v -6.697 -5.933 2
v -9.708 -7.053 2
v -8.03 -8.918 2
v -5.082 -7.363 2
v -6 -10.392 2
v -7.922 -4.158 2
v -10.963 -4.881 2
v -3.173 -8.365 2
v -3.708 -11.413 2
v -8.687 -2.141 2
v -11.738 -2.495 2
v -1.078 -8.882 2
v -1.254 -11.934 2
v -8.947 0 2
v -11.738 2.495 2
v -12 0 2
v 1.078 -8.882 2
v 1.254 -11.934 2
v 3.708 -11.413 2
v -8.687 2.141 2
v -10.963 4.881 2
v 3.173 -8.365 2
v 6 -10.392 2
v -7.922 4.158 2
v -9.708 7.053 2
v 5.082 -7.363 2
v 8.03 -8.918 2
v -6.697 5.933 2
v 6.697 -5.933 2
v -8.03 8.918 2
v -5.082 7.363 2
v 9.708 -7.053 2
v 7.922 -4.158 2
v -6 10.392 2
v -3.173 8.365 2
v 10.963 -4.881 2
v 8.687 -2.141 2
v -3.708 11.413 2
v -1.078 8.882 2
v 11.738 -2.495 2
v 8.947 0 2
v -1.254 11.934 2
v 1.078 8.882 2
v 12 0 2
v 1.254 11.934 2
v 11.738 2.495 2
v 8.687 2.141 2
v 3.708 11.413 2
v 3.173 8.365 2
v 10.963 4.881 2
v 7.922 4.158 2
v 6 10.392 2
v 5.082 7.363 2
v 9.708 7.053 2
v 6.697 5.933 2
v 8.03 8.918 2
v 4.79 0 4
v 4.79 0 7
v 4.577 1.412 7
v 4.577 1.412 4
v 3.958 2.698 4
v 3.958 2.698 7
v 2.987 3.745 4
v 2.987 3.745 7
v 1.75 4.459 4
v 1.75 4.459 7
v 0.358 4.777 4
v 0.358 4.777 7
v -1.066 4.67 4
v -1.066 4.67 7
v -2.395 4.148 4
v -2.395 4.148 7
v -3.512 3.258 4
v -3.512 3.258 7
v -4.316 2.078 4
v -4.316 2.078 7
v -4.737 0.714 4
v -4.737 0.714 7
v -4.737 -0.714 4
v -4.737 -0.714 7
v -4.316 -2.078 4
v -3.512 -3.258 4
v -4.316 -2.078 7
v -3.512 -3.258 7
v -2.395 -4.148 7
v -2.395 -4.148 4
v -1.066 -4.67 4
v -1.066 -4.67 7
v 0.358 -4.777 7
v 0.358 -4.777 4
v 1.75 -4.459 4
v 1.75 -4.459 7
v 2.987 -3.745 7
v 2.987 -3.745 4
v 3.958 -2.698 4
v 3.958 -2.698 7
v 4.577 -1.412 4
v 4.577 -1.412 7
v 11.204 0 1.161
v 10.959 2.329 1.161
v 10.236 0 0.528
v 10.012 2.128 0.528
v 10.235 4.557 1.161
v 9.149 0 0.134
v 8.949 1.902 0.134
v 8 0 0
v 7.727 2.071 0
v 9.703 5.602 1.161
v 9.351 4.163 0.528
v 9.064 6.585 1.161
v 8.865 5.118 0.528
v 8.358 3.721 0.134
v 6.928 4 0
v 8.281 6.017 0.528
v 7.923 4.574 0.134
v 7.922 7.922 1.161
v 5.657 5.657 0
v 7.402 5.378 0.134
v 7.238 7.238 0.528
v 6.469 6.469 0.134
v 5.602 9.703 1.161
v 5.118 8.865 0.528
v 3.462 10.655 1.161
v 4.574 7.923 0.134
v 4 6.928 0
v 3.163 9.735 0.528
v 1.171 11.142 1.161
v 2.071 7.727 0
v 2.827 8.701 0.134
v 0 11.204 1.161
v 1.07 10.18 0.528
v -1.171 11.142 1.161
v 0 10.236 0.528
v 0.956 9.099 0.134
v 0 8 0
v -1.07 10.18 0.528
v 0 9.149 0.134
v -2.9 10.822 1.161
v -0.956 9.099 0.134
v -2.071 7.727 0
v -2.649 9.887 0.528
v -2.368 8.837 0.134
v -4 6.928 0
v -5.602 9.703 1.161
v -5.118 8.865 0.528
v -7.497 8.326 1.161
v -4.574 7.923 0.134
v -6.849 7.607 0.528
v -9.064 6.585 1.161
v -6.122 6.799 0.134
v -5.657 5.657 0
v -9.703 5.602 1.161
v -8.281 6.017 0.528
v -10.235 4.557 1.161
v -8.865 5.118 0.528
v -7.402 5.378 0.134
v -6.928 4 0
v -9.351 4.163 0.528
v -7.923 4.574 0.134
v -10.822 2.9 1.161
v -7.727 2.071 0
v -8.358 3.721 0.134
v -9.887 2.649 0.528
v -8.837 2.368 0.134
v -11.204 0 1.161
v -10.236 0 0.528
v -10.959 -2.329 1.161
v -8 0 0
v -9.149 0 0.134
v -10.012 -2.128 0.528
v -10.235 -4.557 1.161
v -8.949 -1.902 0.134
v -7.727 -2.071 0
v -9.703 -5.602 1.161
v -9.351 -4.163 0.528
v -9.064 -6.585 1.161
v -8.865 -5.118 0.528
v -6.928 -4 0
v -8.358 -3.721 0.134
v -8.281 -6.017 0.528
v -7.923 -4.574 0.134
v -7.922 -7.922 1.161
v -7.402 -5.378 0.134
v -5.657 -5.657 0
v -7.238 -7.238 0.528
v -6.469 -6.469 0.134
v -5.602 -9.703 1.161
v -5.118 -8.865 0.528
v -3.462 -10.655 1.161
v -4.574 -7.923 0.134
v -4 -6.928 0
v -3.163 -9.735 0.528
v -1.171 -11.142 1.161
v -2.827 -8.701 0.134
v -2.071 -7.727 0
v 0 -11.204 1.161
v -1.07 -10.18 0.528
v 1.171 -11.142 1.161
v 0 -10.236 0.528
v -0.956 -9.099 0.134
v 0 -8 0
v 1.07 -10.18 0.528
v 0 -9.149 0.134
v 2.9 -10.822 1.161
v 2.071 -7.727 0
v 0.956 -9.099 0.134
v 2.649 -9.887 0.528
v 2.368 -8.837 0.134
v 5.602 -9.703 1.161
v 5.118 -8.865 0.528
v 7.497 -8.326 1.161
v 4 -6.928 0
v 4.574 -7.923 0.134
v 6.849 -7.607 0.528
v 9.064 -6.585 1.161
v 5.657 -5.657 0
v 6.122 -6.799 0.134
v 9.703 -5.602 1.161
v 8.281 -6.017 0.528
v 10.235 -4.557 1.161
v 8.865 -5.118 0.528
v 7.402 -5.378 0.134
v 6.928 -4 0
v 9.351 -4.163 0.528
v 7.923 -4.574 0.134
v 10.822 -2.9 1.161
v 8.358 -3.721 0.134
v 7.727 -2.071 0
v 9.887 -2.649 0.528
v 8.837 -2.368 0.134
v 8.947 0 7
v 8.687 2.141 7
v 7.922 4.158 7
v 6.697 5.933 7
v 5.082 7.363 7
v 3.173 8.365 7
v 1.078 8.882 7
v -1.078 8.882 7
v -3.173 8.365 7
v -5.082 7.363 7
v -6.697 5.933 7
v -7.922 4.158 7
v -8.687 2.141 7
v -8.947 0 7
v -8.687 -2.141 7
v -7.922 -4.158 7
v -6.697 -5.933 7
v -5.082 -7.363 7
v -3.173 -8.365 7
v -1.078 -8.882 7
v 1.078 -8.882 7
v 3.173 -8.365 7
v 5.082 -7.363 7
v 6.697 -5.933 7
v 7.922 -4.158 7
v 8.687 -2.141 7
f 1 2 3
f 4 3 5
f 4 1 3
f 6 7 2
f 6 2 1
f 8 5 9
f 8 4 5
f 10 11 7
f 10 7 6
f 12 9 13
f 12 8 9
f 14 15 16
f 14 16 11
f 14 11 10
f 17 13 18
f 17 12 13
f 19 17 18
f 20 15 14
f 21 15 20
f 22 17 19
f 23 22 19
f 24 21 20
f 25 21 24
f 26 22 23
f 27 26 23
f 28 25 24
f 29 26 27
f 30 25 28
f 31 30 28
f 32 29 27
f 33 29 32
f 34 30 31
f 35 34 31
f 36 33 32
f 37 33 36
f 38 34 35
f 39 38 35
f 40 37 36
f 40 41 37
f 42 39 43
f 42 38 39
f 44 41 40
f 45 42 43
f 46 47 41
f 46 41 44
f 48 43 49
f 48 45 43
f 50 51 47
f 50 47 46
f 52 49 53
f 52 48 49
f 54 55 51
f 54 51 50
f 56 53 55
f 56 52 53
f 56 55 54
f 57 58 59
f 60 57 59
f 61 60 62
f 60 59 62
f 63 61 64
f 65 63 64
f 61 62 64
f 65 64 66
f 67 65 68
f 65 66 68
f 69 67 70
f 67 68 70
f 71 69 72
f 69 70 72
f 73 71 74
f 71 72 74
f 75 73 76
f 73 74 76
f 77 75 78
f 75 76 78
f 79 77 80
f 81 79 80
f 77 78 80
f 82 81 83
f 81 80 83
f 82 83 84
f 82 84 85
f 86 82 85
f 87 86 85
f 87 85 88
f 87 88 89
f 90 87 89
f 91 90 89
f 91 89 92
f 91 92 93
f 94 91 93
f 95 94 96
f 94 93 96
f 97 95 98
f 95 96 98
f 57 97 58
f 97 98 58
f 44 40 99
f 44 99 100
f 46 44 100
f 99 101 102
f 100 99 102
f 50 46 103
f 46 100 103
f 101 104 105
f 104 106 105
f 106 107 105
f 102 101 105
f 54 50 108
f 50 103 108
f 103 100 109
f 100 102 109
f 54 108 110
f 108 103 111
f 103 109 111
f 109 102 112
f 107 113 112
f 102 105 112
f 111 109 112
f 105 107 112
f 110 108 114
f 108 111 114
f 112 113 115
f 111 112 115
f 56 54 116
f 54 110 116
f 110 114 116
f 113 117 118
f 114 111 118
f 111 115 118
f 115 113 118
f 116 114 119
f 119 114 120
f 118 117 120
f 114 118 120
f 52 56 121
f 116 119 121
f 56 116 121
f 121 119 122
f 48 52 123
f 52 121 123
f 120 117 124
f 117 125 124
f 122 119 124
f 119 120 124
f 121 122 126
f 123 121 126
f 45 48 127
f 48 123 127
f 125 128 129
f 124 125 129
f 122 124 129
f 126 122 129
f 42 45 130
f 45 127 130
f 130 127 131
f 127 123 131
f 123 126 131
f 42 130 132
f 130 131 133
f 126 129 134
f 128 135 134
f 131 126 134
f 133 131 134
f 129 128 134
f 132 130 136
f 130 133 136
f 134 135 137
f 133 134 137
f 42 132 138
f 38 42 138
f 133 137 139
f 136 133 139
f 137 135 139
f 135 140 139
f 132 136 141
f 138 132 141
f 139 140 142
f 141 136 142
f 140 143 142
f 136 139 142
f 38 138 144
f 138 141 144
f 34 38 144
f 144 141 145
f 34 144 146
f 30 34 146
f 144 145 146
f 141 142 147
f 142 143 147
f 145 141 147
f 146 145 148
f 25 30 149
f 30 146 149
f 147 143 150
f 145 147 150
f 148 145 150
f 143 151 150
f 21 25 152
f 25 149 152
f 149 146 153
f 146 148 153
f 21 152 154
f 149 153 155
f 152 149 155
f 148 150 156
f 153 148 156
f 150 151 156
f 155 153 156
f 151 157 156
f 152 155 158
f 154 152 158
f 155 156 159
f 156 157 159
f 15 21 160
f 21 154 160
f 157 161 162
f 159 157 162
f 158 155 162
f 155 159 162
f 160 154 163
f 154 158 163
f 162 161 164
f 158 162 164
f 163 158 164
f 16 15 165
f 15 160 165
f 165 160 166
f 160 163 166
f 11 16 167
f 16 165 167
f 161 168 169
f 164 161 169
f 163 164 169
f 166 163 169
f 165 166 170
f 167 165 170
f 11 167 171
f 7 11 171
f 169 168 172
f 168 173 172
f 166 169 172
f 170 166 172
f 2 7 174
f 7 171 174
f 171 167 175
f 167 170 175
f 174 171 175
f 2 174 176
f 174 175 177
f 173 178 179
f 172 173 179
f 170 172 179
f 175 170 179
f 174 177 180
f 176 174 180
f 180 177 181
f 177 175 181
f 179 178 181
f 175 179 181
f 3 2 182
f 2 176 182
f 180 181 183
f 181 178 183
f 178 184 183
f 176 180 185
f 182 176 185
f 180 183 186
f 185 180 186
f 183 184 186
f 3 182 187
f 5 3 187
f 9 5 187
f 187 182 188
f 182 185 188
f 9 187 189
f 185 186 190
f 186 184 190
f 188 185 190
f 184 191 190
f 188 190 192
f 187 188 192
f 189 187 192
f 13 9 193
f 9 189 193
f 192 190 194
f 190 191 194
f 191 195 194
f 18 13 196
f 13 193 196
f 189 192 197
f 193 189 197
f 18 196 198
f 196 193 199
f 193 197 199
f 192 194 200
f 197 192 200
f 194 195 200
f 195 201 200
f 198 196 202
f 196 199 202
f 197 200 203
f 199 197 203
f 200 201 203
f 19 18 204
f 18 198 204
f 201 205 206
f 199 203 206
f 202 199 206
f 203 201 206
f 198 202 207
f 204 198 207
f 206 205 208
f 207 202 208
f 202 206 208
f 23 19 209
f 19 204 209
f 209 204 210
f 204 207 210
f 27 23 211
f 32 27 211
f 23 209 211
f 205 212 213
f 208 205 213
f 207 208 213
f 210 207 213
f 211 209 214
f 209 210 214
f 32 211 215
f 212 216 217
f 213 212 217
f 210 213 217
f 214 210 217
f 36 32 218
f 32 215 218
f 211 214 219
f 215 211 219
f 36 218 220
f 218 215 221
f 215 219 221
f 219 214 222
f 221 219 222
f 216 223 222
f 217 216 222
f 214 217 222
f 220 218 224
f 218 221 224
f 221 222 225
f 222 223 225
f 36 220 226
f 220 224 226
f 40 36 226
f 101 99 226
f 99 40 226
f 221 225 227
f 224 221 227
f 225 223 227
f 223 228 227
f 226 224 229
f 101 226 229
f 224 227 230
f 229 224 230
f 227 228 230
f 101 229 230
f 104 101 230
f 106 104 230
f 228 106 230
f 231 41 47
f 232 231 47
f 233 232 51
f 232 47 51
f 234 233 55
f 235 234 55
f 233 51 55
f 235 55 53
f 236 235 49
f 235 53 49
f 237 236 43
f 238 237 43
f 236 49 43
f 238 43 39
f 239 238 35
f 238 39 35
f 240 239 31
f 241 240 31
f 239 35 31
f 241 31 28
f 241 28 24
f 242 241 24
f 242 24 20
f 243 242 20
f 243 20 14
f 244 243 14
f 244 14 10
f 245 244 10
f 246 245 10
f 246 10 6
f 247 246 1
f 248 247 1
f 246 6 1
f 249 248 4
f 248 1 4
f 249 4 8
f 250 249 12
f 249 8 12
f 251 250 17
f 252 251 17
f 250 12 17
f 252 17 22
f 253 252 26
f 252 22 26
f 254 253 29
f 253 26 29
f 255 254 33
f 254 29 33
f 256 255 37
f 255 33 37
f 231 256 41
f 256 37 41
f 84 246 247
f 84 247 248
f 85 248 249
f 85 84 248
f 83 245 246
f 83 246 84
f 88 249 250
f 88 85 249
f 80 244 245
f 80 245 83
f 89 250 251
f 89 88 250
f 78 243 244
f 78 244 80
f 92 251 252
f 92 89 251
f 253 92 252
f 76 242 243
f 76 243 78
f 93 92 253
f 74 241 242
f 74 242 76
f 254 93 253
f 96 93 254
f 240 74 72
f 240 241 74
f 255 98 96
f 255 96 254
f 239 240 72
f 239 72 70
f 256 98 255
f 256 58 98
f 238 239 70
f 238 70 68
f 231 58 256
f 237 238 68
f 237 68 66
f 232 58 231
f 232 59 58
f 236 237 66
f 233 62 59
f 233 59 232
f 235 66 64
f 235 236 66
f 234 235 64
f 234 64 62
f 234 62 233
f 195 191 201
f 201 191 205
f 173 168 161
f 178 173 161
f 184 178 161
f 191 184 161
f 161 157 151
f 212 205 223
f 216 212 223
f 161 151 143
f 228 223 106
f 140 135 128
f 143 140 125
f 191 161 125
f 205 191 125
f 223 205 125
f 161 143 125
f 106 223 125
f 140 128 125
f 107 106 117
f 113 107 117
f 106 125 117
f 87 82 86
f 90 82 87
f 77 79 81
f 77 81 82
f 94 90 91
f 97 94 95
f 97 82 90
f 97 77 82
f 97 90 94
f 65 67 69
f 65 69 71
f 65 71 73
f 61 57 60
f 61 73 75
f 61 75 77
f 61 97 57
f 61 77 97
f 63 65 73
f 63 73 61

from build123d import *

# Parameters (mm, degrees)
F0_R     = 12
F1_DEPTH = 2
F2_R     = 8.9467567694
F3_DEPTH = 5
F4_R     = 4.7902731663
F5_DEPTH = 3


# Not quite as in the source:
# - a fillet or chamfer that OpenCascade refuses, or shapes differently, is made with other operations: its cross-section is extruded or revolved along the edge and cut away or added


with BuildPart() as f1:
    # F0 (on Top) → F1 (new body)
    with BuildSketch(Plane.XY):
        Circle(F0_R)
    extrude(amount=F1_DEPTH)

    # F2 (on face) → F3 (join)
    with BuildSketch(Plane.XY.offset(2)):
        Circle(F2_R)
    extrude(amount=F3_DEPTH)

    # F4 (on face) → F5 (cut)
    with BuildSketch(Plane.XY.offset(7)):
        Circle(F4_R)
    extrude(amount=-F5_DEPTH, mode=Mode.SUBTRACT)

    # F6: fillet of radius 5 on 1 edges, made by hand

    # F6_s1 → F6_t2 (revolve, cut)
    with BuildSketch(Plane.XZ):
        with BuildLine():
            ThreePointArc((12, 2), (10.2360679775, 0.527864045), (8, 0))
            Line((8, 0), (12, 0))
            Line((12, 0), (12, 2))
        make_face()
    revolve(axis=Axis((0, 0, 0), (0, 0, 1)), mode=Mode.SUBTRACT)


solid = f1.part
